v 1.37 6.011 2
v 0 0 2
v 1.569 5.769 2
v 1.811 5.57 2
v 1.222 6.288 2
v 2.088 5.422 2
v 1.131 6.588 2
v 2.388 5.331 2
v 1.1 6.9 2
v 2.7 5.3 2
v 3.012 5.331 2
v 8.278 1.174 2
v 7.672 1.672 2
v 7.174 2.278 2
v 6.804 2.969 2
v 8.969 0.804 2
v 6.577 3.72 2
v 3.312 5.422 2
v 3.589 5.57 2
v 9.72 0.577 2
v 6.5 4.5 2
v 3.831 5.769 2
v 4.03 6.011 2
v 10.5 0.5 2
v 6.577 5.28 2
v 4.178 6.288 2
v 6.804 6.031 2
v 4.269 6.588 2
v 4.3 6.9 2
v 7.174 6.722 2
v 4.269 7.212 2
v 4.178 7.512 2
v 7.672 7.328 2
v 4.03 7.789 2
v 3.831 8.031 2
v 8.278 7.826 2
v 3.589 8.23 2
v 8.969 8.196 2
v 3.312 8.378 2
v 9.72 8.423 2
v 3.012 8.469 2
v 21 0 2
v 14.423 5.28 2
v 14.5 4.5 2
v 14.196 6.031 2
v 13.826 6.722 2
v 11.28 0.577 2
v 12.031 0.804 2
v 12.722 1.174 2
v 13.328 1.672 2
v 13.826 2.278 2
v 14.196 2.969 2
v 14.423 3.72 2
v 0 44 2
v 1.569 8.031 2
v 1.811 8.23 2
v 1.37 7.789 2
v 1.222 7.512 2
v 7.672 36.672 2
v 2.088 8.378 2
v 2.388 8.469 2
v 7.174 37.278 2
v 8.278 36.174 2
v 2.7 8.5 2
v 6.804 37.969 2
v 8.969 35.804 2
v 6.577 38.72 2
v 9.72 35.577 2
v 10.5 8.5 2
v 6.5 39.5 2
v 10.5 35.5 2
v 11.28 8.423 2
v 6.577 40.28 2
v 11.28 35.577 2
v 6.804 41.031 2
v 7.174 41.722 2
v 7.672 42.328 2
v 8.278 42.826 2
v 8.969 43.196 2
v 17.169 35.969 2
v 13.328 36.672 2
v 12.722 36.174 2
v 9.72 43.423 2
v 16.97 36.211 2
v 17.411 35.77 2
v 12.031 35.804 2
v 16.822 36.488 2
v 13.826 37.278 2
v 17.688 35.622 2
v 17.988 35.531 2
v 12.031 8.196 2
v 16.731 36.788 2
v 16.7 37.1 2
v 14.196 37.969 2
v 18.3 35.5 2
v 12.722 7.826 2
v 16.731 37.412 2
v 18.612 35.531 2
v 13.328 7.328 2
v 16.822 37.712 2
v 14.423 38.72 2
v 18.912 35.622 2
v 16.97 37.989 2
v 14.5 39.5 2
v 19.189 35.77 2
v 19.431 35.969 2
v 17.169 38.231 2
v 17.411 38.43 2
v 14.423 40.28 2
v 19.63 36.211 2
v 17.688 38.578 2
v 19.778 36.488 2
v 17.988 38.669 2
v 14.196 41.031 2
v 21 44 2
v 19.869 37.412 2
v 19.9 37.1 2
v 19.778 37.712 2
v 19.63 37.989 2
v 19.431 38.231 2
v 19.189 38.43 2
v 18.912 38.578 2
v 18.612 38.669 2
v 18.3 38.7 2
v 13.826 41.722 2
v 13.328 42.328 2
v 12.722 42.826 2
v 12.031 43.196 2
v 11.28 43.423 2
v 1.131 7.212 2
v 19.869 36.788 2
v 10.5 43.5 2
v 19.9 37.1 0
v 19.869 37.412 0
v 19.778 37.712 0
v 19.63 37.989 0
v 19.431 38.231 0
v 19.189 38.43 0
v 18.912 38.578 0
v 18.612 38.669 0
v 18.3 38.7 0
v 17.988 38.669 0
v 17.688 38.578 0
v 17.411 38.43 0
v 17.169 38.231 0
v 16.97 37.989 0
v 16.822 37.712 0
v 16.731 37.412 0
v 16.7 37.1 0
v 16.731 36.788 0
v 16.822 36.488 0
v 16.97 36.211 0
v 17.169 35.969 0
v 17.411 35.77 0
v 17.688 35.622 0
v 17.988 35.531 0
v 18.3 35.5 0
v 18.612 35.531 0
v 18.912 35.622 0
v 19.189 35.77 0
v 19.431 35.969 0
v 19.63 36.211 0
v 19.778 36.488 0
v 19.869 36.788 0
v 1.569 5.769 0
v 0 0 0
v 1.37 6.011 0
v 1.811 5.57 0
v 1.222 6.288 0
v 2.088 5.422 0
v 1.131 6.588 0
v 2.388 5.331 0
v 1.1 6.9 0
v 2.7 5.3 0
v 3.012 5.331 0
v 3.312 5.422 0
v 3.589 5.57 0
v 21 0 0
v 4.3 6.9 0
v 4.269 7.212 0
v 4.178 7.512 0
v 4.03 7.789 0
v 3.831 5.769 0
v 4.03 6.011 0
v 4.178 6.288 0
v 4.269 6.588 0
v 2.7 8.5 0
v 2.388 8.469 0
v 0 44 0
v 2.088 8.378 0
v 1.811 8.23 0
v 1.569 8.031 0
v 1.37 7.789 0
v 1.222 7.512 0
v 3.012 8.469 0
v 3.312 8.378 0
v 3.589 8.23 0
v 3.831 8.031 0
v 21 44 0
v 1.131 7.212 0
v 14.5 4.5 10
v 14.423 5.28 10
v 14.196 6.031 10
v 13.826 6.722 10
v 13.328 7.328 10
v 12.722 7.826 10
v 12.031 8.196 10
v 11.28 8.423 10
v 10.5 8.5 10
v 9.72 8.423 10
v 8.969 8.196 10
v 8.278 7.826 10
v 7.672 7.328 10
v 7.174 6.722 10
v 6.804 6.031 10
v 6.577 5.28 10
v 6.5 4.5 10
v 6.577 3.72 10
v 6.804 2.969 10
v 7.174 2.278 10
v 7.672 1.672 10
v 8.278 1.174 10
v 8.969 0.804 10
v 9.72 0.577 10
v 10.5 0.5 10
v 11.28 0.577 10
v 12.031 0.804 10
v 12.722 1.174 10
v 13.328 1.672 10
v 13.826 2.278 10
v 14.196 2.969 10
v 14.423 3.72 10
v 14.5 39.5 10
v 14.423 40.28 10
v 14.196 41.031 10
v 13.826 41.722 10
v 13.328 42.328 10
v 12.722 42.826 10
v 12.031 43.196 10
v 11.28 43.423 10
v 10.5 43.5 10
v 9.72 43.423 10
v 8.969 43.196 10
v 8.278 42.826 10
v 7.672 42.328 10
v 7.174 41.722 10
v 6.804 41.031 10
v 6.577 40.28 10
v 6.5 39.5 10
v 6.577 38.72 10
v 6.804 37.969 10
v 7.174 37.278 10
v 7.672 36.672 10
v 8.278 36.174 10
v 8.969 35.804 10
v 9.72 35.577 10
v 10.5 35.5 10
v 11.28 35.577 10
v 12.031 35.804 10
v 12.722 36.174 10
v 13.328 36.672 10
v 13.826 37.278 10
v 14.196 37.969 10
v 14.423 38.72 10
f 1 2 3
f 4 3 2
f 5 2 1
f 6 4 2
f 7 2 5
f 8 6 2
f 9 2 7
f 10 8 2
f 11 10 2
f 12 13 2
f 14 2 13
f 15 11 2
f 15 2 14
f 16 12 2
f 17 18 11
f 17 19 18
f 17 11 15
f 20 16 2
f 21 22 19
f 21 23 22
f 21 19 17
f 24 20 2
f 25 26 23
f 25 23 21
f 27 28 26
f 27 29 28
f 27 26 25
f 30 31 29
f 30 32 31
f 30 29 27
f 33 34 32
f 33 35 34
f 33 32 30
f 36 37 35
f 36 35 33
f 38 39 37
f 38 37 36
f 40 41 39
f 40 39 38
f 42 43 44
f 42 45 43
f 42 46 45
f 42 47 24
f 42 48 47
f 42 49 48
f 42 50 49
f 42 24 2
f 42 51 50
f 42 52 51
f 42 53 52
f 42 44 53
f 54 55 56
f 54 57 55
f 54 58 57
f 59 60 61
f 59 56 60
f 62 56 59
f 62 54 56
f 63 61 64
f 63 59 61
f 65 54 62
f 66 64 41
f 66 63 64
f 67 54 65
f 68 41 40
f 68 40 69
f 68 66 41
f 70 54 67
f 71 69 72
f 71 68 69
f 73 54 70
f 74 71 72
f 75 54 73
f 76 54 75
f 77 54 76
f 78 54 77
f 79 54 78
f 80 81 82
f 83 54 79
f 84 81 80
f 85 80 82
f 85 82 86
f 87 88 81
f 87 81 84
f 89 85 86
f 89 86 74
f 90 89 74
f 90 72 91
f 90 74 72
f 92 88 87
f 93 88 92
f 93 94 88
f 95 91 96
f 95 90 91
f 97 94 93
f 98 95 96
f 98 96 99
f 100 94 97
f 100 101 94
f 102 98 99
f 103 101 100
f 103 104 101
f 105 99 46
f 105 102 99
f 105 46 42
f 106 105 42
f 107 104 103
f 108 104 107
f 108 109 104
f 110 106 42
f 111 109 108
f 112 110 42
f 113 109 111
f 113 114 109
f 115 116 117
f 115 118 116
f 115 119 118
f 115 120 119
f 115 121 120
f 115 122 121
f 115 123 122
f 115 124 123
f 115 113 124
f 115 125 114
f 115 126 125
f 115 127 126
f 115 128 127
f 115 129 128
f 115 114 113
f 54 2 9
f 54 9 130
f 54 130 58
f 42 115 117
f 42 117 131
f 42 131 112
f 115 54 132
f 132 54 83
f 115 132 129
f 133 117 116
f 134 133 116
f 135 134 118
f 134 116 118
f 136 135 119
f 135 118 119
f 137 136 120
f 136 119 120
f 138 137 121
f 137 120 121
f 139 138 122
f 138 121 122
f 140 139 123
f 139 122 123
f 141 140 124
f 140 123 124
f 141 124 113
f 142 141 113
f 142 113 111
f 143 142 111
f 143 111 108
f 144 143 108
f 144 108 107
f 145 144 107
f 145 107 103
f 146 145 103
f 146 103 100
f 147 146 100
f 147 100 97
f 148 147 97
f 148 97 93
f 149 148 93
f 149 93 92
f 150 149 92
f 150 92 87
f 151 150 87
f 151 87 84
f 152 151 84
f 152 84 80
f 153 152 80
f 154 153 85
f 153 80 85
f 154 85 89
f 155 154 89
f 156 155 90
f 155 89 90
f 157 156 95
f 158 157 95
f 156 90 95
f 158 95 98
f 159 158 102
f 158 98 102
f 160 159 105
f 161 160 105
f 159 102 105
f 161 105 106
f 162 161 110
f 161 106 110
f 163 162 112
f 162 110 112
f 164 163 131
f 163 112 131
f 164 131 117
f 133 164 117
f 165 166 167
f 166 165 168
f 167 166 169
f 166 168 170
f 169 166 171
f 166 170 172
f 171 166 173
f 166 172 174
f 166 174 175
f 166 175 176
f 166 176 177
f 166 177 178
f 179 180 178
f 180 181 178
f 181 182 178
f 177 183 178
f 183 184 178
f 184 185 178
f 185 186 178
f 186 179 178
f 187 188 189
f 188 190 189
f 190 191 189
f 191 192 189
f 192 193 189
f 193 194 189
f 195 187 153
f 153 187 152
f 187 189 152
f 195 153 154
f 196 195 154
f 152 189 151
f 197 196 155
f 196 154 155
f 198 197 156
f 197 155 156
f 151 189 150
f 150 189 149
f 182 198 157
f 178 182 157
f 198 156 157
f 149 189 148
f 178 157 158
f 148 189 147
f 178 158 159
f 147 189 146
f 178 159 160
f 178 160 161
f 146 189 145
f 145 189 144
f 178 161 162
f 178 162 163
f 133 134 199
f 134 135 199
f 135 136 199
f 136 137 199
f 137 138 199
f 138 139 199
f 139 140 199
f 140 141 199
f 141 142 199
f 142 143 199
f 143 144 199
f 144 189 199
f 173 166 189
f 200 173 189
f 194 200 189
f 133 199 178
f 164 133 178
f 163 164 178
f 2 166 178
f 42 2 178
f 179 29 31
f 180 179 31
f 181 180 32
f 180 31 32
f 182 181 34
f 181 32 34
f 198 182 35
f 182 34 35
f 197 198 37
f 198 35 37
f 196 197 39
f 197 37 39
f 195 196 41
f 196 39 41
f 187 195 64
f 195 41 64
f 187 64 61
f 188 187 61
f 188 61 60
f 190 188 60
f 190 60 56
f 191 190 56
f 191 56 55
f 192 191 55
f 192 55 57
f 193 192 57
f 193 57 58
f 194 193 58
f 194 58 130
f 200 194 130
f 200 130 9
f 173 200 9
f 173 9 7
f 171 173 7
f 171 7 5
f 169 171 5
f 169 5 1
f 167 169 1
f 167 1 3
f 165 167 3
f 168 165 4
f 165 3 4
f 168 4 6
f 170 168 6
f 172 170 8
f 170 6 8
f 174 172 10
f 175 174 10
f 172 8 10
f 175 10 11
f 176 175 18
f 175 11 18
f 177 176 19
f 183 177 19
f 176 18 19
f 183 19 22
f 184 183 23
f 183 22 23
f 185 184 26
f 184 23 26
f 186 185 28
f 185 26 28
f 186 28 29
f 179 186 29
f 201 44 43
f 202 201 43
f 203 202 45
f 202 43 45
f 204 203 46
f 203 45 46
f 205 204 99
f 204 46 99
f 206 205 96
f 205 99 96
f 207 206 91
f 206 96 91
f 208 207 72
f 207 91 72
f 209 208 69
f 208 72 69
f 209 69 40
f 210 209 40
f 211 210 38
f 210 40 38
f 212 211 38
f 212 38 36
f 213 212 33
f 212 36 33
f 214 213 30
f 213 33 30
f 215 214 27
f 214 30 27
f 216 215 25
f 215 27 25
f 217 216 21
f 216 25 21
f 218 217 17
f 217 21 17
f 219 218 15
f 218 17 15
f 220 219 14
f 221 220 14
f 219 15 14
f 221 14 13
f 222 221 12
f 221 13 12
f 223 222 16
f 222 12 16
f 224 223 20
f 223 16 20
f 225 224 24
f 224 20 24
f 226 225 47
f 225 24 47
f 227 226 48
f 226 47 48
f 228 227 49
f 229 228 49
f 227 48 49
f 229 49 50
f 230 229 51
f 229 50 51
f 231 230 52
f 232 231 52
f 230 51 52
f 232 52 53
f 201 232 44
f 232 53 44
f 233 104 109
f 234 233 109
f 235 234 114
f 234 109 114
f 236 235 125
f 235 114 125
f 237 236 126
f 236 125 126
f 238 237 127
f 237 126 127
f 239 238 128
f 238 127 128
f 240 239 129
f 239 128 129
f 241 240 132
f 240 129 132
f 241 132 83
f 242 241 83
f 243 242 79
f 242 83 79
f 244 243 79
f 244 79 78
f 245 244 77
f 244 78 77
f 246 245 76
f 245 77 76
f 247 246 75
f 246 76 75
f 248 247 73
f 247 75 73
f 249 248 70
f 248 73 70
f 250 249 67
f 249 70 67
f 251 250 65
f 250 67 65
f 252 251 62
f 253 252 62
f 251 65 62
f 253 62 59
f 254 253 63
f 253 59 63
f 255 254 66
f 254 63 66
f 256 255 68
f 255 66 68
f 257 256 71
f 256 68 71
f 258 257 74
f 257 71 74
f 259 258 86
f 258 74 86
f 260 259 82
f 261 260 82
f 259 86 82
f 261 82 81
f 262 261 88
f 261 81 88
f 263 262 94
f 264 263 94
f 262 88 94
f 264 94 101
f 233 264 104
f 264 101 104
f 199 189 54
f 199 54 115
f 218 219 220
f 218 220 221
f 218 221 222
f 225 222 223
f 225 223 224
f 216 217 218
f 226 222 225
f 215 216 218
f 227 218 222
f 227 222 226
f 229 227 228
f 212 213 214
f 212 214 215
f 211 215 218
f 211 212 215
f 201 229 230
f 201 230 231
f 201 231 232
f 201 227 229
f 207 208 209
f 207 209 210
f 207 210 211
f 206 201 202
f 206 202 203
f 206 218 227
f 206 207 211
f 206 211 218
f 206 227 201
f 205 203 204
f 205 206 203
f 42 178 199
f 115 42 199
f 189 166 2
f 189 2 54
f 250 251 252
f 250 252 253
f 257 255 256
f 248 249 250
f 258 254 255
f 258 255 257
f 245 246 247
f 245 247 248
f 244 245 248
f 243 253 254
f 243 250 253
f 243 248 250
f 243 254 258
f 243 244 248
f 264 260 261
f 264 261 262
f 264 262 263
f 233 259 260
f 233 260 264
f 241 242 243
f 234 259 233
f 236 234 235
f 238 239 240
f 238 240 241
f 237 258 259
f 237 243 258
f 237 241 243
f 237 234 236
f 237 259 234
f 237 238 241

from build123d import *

# Parameters (mm, degrees)
SKETCH1_W           = 21
SKETCH1_H           = 44
BOSS_EXTRUDE1_DEPTH = 2
SKETCH2_R           = 1.6
CUT_EXTRUDE1_DEPTH  = 3
SKETCH3_R           = 4
BOSS_EXTRUDE2_DEPTH = 8


with BuildPart() as part:
    # Sketch1 → Boss-Extrude1 (new body)
    with BuildSketch(Plane.XY):
        with Locations((10.5, 22)):
            Rectangle(SKETCH1_W, SKETCH1_H)
    extrude(amount=BOSS_EXTRUDE1_DEPTH)

    # Sketch2 → Cut-Extrude1 (cut, through all)
    with BuildSketch(Plane.XY.offset(2)):
        with Locations((18.3, 37.1)):
            Circle(SKETCH2_R)
        with Locations((2.7, 6.9)):
            Circle(SKETCH2_R)
    extrude(amount=-CUT_EXTRUDE1_DEPTH, mode=Mode.SUBTRACT)

    # Sketch3 → Boss-Extrude2 (add)
    with BuildSketch(Plane.XY.offset(2)):
        with Locations((10.5, 39.5)):
            Circle(SKETCH3_R)
        with Locations((10.5, 4.5)):
            Circle(SKETCH3_R)
    extrude(amount=BOSS_EXTRUDE2_DEPTH)


solid = part.part
